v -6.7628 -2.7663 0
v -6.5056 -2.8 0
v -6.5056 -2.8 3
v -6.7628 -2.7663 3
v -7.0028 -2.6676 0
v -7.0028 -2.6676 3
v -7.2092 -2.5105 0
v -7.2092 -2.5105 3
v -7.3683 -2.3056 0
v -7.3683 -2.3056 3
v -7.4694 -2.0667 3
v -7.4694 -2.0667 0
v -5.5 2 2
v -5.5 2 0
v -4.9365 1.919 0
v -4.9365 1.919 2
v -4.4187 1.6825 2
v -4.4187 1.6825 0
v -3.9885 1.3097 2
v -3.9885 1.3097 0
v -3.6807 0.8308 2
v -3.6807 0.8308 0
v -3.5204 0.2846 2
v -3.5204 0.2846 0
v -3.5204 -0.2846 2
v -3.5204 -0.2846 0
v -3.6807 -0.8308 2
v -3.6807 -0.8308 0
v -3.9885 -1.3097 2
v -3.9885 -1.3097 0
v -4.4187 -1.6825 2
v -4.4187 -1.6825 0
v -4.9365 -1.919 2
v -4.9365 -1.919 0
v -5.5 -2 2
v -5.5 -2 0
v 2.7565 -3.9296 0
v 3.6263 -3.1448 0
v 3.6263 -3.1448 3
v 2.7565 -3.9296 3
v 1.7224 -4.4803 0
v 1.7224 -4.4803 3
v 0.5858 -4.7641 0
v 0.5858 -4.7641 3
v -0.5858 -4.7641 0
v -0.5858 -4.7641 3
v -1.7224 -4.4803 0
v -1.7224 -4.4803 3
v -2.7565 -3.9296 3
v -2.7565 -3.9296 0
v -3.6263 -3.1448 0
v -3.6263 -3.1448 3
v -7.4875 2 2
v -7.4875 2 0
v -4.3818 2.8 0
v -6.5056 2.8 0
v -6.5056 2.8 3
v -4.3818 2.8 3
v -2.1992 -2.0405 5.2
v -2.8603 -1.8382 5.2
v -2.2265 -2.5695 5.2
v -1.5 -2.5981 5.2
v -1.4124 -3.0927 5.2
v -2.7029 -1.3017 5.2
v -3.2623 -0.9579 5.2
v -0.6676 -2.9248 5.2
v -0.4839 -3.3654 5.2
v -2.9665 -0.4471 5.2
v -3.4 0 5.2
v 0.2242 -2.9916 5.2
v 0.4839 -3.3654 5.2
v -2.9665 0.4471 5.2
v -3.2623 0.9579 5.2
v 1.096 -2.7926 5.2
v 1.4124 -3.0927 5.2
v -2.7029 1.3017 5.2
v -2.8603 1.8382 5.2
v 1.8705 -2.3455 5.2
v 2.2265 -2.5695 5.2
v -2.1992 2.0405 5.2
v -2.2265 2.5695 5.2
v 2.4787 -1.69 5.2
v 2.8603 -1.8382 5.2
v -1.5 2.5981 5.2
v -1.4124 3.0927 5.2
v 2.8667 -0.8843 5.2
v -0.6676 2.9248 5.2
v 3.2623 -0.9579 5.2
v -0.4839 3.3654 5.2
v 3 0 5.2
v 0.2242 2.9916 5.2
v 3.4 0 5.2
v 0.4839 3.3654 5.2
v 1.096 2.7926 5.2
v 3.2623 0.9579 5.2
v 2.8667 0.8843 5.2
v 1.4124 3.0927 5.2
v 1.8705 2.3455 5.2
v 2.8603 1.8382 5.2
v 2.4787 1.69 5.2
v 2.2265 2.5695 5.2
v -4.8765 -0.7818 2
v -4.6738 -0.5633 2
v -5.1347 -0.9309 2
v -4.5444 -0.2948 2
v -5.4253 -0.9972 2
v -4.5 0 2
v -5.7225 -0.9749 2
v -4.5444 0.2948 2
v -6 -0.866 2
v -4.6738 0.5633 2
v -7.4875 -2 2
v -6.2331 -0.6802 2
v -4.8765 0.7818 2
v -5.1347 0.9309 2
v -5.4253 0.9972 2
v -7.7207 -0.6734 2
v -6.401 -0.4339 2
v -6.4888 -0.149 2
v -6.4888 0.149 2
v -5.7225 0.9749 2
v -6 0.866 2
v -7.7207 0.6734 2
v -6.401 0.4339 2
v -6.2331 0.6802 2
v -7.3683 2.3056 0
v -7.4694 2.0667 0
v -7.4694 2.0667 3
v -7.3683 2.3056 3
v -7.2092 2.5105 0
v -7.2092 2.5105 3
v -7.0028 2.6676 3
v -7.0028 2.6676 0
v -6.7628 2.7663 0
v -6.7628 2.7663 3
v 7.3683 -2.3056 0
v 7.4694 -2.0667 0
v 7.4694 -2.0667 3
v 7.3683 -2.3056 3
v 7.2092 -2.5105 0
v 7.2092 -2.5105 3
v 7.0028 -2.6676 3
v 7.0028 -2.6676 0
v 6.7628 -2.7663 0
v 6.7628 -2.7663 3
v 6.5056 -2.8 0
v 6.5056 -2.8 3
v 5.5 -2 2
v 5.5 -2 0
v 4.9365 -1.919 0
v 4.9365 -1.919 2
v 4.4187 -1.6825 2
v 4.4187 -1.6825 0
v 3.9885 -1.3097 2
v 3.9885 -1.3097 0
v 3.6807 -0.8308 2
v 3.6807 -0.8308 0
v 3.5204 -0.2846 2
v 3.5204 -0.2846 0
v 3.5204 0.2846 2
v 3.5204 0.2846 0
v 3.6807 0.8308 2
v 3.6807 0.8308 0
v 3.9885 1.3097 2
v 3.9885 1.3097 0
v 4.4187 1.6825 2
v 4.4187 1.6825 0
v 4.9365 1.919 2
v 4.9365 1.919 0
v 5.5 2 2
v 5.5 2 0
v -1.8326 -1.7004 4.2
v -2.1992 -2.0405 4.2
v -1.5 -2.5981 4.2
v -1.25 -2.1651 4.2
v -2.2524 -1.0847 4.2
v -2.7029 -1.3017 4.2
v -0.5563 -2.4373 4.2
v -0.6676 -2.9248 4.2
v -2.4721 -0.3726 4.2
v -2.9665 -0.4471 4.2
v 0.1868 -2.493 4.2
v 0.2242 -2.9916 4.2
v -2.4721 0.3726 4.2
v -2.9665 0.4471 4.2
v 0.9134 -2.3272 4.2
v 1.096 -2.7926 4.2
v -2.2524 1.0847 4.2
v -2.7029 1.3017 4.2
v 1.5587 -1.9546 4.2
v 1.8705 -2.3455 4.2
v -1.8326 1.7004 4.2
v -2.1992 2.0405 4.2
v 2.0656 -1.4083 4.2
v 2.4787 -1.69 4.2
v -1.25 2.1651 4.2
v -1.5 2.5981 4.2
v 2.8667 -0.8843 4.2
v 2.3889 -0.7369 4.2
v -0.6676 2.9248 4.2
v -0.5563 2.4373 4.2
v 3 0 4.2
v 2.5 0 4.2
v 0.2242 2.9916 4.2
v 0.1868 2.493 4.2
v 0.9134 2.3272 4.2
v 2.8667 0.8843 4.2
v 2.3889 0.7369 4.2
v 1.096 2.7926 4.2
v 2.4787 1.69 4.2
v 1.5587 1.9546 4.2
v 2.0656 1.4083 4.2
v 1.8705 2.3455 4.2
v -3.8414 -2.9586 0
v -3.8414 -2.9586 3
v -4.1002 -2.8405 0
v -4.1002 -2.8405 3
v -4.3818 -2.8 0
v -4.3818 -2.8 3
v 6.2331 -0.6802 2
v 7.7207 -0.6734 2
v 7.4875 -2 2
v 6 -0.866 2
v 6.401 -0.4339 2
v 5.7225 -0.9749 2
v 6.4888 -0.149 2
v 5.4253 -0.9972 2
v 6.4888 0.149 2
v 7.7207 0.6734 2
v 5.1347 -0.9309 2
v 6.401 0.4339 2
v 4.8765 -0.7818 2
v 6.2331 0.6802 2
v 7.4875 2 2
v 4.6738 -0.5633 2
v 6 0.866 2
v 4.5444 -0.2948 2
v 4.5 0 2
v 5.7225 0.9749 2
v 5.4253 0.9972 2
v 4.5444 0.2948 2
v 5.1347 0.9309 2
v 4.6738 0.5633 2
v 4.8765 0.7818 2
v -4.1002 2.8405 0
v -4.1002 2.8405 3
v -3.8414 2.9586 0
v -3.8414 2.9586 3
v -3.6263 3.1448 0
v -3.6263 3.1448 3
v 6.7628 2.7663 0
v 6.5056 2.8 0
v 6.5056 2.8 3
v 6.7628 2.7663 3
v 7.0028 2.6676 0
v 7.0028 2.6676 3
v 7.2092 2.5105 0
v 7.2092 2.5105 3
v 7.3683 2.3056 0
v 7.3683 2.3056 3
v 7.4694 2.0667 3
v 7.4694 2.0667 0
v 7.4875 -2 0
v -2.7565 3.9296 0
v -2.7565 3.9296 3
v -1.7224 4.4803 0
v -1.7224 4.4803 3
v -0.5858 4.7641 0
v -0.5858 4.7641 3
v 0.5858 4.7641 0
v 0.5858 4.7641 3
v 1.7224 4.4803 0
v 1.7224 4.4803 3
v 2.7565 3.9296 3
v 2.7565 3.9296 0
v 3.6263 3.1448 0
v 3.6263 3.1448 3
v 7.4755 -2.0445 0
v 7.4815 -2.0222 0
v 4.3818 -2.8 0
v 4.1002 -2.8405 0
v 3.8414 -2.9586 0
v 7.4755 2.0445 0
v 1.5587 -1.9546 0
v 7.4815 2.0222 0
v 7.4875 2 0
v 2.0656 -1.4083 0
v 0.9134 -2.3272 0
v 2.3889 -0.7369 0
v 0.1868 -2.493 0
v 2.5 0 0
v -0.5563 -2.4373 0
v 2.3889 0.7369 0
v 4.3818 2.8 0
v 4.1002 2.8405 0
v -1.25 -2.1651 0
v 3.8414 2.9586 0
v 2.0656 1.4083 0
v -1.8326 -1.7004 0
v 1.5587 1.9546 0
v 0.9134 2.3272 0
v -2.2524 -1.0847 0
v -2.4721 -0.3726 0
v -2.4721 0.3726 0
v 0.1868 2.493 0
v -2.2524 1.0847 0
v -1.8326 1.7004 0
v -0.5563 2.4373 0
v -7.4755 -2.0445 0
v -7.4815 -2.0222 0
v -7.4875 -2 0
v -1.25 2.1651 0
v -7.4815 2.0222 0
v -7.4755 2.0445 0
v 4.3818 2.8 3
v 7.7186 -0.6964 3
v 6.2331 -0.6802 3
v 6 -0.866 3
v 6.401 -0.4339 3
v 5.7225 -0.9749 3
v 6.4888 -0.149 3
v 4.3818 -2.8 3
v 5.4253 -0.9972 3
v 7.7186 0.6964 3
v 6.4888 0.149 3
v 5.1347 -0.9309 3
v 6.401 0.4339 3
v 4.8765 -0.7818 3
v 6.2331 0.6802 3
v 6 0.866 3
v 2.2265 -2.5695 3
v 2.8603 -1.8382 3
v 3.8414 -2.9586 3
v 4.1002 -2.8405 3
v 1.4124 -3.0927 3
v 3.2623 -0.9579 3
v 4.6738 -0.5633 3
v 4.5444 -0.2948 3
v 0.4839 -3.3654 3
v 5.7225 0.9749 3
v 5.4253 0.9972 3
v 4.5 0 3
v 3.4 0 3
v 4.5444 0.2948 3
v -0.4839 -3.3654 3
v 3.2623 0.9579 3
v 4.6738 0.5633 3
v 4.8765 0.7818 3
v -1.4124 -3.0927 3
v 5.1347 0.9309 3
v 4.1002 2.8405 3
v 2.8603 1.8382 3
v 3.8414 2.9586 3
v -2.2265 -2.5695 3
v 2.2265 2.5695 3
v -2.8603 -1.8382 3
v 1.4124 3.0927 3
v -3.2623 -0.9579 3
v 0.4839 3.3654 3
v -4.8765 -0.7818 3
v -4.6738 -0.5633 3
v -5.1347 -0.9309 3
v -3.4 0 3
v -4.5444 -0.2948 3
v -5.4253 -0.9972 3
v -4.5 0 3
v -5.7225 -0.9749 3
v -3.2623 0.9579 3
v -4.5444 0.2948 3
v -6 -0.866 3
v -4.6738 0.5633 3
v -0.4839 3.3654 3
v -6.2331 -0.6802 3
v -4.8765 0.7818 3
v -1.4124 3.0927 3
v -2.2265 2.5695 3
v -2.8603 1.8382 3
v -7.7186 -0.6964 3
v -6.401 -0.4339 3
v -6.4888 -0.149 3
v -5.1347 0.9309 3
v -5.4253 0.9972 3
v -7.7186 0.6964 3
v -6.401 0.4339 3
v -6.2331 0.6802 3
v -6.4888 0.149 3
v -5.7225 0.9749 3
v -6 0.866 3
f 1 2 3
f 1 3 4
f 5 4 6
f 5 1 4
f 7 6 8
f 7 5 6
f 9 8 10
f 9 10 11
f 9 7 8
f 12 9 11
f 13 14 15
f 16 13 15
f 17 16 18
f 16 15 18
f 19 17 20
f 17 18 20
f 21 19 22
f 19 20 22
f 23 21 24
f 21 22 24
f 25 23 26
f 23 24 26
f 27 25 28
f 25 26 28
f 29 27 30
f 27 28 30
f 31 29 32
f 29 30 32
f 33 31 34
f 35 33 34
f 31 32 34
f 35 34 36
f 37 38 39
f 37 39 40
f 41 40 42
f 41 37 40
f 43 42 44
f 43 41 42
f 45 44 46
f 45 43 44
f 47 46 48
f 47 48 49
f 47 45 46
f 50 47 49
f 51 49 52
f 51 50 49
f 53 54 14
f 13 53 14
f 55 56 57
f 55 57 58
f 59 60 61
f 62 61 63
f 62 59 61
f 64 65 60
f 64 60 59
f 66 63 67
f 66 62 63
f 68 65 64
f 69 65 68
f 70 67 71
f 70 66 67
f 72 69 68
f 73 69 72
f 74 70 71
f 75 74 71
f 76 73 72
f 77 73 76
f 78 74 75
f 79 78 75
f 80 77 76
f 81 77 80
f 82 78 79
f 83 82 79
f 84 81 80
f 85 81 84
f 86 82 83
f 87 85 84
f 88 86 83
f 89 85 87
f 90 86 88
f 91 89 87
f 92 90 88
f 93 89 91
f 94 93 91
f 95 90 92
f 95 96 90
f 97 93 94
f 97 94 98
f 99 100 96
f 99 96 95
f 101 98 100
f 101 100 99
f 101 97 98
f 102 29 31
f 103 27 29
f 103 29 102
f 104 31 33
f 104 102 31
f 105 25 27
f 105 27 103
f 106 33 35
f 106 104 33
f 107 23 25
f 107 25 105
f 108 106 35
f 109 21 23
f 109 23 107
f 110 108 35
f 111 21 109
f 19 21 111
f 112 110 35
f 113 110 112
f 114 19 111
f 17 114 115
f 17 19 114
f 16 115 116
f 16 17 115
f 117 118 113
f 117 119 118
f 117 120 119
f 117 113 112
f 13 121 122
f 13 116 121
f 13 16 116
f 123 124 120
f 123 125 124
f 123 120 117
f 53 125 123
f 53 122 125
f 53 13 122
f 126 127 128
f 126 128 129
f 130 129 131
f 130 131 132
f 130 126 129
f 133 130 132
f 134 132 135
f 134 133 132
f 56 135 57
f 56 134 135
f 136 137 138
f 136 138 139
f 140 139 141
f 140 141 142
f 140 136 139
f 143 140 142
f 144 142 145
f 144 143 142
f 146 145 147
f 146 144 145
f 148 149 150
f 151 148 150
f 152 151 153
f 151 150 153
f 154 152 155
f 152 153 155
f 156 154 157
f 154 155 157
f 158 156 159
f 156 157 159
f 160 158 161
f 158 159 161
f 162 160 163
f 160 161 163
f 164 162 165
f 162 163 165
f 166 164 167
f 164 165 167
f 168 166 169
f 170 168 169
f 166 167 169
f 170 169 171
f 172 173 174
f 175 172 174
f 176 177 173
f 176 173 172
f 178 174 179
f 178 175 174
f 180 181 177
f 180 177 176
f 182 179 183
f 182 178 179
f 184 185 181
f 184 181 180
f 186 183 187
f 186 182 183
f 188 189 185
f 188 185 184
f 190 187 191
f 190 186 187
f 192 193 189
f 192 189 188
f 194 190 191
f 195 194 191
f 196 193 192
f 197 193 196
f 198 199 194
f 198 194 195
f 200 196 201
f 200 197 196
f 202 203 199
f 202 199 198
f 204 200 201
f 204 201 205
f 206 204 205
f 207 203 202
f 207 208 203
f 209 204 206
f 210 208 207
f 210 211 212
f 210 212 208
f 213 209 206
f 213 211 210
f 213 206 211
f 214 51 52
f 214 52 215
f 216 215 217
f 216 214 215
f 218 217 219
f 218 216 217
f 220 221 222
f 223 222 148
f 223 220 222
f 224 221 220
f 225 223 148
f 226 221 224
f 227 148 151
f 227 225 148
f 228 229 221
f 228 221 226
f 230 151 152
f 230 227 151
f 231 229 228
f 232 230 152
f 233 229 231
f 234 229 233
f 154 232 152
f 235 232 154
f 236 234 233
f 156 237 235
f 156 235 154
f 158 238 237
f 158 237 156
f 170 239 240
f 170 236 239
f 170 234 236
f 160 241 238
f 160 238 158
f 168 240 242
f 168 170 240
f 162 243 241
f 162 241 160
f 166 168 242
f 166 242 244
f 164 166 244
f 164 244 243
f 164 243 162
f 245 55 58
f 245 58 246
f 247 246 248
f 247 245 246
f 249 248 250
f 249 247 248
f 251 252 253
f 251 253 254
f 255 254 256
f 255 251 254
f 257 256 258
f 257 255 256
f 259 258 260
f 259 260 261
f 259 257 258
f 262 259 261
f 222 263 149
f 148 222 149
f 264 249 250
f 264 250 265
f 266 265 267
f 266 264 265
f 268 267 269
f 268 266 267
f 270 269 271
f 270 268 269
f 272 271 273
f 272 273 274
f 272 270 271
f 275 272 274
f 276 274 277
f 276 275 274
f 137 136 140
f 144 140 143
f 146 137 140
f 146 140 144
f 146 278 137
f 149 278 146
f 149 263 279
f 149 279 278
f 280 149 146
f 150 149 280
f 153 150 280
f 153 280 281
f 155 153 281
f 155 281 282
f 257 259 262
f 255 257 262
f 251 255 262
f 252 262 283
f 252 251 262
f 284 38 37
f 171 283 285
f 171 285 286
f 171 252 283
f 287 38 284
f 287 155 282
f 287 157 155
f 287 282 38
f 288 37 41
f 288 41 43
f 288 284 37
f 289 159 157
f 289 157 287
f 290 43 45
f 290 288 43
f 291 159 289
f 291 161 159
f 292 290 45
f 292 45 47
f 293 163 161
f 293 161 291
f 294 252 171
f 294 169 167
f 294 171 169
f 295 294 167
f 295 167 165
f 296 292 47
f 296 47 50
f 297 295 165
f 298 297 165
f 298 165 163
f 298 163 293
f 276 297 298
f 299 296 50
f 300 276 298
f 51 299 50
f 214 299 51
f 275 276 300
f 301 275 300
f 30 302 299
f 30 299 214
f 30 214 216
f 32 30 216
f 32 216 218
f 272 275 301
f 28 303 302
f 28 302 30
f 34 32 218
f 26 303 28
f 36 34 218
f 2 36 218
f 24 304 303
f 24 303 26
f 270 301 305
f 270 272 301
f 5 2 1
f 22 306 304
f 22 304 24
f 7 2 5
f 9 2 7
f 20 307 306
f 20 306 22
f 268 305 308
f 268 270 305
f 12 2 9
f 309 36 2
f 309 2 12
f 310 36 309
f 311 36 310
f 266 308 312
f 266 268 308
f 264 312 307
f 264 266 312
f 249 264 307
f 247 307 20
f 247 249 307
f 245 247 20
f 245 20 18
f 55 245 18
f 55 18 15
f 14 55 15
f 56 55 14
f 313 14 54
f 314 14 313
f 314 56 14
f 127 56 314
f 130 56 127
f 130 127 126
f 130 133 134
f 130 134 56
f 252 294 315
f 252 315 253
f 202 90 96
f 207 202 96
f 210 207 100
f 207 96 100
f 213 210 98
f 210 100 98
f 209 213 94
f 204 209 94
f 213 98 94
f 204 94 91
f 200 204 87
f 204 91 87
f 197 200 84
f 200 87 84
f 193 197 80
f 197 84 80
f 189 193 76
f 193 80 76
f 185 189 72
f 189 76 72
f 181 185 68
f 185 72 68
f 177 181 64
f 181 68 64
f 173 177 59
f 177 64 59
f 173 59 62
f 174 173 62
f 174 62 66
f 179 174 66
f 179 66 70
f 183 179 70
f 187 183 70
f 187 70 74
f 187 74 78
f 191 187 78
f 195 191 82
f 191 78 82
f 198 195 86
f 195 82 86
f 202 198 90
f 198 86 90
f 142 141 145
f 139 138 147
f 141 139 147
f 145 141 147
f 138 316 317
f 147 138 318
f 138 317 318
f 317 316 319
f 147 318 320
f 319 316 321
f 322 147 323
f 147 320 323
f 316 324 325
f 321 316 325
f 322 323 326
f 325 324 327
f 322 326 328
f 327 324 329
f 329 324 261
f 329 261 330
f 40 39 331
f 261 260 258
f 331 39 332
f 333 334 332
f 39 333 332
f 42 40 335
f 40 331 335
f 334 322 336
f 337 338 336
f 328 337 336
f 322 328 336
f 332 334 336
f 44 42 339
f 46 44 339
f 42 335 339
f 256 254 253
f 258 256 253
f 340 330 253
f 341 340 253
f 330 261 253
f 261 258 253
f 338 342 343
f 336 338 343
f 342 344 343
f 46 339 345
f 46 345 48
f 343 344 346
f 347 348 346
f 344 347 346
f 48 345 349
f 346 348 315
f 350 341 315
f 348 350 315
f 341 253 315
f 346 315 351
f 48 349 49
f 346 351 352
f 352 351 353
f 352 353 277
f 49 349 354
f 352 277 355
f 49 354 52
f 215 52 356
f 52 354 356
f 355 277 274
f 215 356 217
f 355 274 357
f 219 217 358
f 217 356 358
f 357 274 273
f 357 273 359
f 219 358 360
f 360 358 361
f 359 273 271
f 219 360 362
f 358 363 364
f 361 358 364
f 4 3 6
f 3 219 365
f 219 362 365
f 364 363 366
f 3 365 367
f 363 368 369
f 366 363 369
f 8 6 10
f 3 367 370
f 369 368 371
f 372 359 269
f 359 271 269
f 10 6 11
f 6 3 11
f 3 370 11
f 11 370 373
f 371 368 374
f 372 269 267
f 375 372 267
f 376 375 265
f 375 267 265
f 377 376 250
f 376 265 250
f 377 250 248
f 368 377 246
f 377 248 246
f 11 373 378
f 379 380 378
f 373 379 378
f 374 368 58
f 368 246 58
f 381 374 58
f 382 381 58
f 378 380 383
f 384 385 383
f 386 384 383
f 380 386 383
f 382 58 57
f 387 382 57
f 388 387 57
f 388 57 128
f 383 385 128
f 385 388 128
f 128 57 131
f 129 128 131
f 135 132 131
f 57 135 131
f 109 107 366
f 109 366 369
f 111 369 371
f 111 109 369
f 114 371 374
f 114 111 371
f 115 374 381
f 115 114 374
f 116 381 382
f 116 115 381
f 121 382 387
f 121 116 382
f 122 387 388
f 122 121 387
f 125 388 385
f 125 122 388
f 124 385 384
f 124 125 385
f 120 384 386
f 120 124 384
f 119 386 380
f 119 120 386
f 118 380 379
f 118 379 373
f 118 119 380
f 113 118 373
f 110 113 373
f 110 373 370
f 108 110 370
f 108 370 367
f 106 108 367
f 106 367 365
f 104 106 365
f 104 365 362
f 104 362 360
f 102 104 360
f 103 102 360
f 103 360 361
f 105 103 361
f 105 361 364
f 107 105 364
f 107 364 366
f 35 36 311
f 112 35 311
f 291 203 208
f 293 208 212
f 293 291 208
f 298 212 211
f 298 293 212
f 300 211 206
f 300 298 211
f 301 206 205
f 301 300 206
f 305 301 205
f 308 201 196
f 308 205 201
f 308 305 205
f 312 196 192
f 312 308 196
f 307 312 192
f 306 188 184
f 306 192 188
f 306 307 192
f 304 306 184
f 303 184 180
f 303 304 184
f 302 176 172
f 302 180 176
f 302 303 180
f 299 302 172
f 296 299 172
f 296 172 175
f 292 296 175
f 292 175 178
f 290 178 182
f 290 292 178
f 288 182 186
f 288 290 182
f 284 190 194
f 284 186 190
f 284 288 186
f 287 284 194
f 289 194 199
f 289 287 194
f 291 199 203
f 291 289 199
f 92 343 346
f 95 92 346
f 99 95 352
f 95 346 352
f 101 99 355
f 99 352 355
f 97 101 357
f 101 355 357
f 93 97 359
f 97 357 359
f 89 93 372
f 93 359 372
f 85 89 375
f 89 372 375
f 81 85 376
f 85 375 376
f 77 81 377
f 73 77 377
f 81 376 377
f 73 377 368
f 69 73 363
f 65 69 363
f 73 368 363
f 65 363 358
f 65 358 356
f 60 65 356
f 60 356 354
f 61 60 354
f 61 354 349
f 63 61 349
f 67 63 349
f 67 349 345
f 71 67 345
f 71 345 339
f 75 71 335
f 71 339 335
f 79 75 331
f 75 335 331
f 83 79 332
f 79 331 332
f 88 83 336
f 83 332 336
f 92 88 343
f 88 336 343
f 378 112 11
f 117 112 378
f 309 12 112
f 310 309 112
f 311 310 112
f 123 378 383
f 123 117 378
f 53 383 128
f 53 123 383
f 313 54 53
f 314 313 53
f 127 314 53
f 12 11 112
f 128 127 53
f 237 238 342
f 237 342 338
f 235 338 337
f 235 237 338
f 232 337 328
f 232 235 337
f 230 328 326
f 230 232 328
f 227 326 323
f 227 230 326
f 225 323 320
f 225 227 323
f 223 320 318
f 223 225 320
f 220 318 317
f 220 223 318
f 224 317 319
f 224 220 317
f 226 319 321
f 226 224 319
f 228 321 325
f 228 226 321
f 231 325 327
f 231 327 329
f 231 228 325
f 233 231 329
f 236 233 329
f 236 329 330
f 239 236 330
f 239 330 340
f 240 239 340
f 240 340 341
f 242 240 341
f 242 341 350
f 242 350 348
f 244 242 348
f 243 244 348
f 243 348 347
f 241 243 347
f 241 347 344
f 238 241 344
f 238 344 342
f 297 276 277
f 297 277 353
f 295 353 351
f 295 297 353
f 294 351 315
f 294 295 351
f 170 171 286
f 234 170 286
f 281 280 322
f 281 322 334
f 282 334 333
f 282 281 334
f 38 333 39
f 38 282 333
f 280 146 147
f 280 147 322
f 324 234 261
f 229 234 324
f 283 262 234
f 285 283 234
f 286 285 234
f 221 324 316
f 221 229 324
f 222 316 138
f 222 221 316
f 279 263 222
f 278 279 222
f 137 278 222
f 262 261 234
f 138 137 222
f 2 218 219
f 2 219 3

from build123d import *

# Parameters (mm, degrees)
SKETCH_1_R          = 2.5
SKETCH_1_R_2        = 1
EXTRUDE_1_DEPTH     = 3
SKETCH_2_R          = 3.4
SKETCH_2_R_2        = 2.5
EXTRUDE_2_DEPTH     = 2.2
CUT_EXTRUDE_1_DEPTH = 2
SKETCH_5_R          = 3
CUT_EXTRUDE_2_DEPTH = 1


with BuildPart() as part:
    # 草图1 → 凸台-拉伸1 (new body)
    with BuildSketch(Plane.XY):
        with BuildLine():
            Line((-6.505574533, 2.8), (-4.38178046, 2.8))
            ThreePointArc((-4.38178046, 2.8), (-3.966553061, 2.890282348), (-3.62630107, 3.144827586))
            ThreePointArc((-3.62630107, 3.144827586), (0, 4.8), (3.62630107, 3.144827586))
            ThreePointArc((3.62630107, 3.144827586), (3.966553061, 2.890282348), (4.38178046, 2.8))
            Line((4.38178046, 2.8), (6.505574533, 2.8))
            ThreePointArc((6.505574533, 2.8), (7.111104603, 2.595822426), (7.469363352, 2.066666667))
            ThreePointArc((7.469363352, 2.066666667), (7.75, 0), (7.469363352, -2.066666667))
            ThreePointArc((7.469363352, -2.066666667), (7.111104603, -2.595822426), (6.505574533, -2.8))
            Line((6.505574533, -2.8), (4.38178046, -2.8))
            ThreePointArc((4.38178046, -2.8), (3.966553061, -2.890282348), (3.62630107, -3.144827586))
            ThreePointArc((3.62630107, -3.144827586), (0, -4.8), (-3.62630107, -3.144827586))
            ThreePointArc((-3.62630107, -3.144827586), (-3.966553061, -2.890282348), (-4.38178046, -2.8))
            Line((-4.38178046, -2.8), (-6.505574533, -2.8))
            ThreePointArc((-6.505574533, -2.8), (-7.111104603, -2.595822426), (-7.469363352, -2.066666667))
            ThreePointArc((-7.469363352, -2.066666667), (-7.75, 0), (-7.469363352, 2.066666667))
            ThreePointArc((-7.469363352, 2.066666667), (-7.111104603, 2.595822426), (-6.505574533, 2.8))
        make_face()
        Circle(SKETCH_1_R, mode=Mode.SUBTRACT)
        with Locations((-5.5, 0)):
            Circle(SKETCH_1_R_2, mode=Mode.SUBTRACT)
        with Locations(Location((5.5, 0, 0), (0, 0, 180))):
            Circle(SKETCH_1_R_2, mode=Mode.SUBTRACT)
    extrude(amount=EXTRUDE_1_DEPTH)

    # 草图2 → 凸台-拉伸2 (add)
    with BuildSketch(Plane.XY.offset(3)):
        Circle(SKETCH_2_R)
        Circle(SKETCH_2_R_2, mode=Mode.SUBTRACT)
    extrude(amount=EXTRUDE_2_DEPTH)

    # 草图4 → 切除-拉伸1 (cut)
    with BuildSketch(Plane(origin=(0, 0, 0), x_dir=(-1, 0, 0), z_dir=(0, 0, -1))):
        with BuildLine():
            Line((-5.5, 2), (-7.487489566, 2))
            ThreePointArc((-7.487489566, 2), (-7.75, 0), (-7.487489566, -2))
            Line((-7.487489566, -2), (-5.5, -2))
            ThreePointArc((-5.5, -2), (-3.5, 0), (-5.5, 2))
        make_face()
        with BuildLine():
            Line((5.5, -2), (7.487489566, -2))
            ThreePointArc((7.487489566, -2), (7.75, 0), (7.487489566, 2))
            Line((7.487489566, 2), (5.5, 2))
            ThreePointArc((5.5, 2), (3.5, 0), (5.5, -2))
        make_face()
    extrude(amount=-CUT_EXTRUDE_1_DEPTH, mode=Mode.SUBTRACT)

    # 草图5 → 切除-拉伸2 (cut)
    with BuildSketch(Plane.XY.offset(5.2)):
        Circle(SKETCH_5_R)
    extrude(amount=-CUT_EXTRUDE_2_DEPTH, mode=Mode.SUBTRACT)


solid = part.part
